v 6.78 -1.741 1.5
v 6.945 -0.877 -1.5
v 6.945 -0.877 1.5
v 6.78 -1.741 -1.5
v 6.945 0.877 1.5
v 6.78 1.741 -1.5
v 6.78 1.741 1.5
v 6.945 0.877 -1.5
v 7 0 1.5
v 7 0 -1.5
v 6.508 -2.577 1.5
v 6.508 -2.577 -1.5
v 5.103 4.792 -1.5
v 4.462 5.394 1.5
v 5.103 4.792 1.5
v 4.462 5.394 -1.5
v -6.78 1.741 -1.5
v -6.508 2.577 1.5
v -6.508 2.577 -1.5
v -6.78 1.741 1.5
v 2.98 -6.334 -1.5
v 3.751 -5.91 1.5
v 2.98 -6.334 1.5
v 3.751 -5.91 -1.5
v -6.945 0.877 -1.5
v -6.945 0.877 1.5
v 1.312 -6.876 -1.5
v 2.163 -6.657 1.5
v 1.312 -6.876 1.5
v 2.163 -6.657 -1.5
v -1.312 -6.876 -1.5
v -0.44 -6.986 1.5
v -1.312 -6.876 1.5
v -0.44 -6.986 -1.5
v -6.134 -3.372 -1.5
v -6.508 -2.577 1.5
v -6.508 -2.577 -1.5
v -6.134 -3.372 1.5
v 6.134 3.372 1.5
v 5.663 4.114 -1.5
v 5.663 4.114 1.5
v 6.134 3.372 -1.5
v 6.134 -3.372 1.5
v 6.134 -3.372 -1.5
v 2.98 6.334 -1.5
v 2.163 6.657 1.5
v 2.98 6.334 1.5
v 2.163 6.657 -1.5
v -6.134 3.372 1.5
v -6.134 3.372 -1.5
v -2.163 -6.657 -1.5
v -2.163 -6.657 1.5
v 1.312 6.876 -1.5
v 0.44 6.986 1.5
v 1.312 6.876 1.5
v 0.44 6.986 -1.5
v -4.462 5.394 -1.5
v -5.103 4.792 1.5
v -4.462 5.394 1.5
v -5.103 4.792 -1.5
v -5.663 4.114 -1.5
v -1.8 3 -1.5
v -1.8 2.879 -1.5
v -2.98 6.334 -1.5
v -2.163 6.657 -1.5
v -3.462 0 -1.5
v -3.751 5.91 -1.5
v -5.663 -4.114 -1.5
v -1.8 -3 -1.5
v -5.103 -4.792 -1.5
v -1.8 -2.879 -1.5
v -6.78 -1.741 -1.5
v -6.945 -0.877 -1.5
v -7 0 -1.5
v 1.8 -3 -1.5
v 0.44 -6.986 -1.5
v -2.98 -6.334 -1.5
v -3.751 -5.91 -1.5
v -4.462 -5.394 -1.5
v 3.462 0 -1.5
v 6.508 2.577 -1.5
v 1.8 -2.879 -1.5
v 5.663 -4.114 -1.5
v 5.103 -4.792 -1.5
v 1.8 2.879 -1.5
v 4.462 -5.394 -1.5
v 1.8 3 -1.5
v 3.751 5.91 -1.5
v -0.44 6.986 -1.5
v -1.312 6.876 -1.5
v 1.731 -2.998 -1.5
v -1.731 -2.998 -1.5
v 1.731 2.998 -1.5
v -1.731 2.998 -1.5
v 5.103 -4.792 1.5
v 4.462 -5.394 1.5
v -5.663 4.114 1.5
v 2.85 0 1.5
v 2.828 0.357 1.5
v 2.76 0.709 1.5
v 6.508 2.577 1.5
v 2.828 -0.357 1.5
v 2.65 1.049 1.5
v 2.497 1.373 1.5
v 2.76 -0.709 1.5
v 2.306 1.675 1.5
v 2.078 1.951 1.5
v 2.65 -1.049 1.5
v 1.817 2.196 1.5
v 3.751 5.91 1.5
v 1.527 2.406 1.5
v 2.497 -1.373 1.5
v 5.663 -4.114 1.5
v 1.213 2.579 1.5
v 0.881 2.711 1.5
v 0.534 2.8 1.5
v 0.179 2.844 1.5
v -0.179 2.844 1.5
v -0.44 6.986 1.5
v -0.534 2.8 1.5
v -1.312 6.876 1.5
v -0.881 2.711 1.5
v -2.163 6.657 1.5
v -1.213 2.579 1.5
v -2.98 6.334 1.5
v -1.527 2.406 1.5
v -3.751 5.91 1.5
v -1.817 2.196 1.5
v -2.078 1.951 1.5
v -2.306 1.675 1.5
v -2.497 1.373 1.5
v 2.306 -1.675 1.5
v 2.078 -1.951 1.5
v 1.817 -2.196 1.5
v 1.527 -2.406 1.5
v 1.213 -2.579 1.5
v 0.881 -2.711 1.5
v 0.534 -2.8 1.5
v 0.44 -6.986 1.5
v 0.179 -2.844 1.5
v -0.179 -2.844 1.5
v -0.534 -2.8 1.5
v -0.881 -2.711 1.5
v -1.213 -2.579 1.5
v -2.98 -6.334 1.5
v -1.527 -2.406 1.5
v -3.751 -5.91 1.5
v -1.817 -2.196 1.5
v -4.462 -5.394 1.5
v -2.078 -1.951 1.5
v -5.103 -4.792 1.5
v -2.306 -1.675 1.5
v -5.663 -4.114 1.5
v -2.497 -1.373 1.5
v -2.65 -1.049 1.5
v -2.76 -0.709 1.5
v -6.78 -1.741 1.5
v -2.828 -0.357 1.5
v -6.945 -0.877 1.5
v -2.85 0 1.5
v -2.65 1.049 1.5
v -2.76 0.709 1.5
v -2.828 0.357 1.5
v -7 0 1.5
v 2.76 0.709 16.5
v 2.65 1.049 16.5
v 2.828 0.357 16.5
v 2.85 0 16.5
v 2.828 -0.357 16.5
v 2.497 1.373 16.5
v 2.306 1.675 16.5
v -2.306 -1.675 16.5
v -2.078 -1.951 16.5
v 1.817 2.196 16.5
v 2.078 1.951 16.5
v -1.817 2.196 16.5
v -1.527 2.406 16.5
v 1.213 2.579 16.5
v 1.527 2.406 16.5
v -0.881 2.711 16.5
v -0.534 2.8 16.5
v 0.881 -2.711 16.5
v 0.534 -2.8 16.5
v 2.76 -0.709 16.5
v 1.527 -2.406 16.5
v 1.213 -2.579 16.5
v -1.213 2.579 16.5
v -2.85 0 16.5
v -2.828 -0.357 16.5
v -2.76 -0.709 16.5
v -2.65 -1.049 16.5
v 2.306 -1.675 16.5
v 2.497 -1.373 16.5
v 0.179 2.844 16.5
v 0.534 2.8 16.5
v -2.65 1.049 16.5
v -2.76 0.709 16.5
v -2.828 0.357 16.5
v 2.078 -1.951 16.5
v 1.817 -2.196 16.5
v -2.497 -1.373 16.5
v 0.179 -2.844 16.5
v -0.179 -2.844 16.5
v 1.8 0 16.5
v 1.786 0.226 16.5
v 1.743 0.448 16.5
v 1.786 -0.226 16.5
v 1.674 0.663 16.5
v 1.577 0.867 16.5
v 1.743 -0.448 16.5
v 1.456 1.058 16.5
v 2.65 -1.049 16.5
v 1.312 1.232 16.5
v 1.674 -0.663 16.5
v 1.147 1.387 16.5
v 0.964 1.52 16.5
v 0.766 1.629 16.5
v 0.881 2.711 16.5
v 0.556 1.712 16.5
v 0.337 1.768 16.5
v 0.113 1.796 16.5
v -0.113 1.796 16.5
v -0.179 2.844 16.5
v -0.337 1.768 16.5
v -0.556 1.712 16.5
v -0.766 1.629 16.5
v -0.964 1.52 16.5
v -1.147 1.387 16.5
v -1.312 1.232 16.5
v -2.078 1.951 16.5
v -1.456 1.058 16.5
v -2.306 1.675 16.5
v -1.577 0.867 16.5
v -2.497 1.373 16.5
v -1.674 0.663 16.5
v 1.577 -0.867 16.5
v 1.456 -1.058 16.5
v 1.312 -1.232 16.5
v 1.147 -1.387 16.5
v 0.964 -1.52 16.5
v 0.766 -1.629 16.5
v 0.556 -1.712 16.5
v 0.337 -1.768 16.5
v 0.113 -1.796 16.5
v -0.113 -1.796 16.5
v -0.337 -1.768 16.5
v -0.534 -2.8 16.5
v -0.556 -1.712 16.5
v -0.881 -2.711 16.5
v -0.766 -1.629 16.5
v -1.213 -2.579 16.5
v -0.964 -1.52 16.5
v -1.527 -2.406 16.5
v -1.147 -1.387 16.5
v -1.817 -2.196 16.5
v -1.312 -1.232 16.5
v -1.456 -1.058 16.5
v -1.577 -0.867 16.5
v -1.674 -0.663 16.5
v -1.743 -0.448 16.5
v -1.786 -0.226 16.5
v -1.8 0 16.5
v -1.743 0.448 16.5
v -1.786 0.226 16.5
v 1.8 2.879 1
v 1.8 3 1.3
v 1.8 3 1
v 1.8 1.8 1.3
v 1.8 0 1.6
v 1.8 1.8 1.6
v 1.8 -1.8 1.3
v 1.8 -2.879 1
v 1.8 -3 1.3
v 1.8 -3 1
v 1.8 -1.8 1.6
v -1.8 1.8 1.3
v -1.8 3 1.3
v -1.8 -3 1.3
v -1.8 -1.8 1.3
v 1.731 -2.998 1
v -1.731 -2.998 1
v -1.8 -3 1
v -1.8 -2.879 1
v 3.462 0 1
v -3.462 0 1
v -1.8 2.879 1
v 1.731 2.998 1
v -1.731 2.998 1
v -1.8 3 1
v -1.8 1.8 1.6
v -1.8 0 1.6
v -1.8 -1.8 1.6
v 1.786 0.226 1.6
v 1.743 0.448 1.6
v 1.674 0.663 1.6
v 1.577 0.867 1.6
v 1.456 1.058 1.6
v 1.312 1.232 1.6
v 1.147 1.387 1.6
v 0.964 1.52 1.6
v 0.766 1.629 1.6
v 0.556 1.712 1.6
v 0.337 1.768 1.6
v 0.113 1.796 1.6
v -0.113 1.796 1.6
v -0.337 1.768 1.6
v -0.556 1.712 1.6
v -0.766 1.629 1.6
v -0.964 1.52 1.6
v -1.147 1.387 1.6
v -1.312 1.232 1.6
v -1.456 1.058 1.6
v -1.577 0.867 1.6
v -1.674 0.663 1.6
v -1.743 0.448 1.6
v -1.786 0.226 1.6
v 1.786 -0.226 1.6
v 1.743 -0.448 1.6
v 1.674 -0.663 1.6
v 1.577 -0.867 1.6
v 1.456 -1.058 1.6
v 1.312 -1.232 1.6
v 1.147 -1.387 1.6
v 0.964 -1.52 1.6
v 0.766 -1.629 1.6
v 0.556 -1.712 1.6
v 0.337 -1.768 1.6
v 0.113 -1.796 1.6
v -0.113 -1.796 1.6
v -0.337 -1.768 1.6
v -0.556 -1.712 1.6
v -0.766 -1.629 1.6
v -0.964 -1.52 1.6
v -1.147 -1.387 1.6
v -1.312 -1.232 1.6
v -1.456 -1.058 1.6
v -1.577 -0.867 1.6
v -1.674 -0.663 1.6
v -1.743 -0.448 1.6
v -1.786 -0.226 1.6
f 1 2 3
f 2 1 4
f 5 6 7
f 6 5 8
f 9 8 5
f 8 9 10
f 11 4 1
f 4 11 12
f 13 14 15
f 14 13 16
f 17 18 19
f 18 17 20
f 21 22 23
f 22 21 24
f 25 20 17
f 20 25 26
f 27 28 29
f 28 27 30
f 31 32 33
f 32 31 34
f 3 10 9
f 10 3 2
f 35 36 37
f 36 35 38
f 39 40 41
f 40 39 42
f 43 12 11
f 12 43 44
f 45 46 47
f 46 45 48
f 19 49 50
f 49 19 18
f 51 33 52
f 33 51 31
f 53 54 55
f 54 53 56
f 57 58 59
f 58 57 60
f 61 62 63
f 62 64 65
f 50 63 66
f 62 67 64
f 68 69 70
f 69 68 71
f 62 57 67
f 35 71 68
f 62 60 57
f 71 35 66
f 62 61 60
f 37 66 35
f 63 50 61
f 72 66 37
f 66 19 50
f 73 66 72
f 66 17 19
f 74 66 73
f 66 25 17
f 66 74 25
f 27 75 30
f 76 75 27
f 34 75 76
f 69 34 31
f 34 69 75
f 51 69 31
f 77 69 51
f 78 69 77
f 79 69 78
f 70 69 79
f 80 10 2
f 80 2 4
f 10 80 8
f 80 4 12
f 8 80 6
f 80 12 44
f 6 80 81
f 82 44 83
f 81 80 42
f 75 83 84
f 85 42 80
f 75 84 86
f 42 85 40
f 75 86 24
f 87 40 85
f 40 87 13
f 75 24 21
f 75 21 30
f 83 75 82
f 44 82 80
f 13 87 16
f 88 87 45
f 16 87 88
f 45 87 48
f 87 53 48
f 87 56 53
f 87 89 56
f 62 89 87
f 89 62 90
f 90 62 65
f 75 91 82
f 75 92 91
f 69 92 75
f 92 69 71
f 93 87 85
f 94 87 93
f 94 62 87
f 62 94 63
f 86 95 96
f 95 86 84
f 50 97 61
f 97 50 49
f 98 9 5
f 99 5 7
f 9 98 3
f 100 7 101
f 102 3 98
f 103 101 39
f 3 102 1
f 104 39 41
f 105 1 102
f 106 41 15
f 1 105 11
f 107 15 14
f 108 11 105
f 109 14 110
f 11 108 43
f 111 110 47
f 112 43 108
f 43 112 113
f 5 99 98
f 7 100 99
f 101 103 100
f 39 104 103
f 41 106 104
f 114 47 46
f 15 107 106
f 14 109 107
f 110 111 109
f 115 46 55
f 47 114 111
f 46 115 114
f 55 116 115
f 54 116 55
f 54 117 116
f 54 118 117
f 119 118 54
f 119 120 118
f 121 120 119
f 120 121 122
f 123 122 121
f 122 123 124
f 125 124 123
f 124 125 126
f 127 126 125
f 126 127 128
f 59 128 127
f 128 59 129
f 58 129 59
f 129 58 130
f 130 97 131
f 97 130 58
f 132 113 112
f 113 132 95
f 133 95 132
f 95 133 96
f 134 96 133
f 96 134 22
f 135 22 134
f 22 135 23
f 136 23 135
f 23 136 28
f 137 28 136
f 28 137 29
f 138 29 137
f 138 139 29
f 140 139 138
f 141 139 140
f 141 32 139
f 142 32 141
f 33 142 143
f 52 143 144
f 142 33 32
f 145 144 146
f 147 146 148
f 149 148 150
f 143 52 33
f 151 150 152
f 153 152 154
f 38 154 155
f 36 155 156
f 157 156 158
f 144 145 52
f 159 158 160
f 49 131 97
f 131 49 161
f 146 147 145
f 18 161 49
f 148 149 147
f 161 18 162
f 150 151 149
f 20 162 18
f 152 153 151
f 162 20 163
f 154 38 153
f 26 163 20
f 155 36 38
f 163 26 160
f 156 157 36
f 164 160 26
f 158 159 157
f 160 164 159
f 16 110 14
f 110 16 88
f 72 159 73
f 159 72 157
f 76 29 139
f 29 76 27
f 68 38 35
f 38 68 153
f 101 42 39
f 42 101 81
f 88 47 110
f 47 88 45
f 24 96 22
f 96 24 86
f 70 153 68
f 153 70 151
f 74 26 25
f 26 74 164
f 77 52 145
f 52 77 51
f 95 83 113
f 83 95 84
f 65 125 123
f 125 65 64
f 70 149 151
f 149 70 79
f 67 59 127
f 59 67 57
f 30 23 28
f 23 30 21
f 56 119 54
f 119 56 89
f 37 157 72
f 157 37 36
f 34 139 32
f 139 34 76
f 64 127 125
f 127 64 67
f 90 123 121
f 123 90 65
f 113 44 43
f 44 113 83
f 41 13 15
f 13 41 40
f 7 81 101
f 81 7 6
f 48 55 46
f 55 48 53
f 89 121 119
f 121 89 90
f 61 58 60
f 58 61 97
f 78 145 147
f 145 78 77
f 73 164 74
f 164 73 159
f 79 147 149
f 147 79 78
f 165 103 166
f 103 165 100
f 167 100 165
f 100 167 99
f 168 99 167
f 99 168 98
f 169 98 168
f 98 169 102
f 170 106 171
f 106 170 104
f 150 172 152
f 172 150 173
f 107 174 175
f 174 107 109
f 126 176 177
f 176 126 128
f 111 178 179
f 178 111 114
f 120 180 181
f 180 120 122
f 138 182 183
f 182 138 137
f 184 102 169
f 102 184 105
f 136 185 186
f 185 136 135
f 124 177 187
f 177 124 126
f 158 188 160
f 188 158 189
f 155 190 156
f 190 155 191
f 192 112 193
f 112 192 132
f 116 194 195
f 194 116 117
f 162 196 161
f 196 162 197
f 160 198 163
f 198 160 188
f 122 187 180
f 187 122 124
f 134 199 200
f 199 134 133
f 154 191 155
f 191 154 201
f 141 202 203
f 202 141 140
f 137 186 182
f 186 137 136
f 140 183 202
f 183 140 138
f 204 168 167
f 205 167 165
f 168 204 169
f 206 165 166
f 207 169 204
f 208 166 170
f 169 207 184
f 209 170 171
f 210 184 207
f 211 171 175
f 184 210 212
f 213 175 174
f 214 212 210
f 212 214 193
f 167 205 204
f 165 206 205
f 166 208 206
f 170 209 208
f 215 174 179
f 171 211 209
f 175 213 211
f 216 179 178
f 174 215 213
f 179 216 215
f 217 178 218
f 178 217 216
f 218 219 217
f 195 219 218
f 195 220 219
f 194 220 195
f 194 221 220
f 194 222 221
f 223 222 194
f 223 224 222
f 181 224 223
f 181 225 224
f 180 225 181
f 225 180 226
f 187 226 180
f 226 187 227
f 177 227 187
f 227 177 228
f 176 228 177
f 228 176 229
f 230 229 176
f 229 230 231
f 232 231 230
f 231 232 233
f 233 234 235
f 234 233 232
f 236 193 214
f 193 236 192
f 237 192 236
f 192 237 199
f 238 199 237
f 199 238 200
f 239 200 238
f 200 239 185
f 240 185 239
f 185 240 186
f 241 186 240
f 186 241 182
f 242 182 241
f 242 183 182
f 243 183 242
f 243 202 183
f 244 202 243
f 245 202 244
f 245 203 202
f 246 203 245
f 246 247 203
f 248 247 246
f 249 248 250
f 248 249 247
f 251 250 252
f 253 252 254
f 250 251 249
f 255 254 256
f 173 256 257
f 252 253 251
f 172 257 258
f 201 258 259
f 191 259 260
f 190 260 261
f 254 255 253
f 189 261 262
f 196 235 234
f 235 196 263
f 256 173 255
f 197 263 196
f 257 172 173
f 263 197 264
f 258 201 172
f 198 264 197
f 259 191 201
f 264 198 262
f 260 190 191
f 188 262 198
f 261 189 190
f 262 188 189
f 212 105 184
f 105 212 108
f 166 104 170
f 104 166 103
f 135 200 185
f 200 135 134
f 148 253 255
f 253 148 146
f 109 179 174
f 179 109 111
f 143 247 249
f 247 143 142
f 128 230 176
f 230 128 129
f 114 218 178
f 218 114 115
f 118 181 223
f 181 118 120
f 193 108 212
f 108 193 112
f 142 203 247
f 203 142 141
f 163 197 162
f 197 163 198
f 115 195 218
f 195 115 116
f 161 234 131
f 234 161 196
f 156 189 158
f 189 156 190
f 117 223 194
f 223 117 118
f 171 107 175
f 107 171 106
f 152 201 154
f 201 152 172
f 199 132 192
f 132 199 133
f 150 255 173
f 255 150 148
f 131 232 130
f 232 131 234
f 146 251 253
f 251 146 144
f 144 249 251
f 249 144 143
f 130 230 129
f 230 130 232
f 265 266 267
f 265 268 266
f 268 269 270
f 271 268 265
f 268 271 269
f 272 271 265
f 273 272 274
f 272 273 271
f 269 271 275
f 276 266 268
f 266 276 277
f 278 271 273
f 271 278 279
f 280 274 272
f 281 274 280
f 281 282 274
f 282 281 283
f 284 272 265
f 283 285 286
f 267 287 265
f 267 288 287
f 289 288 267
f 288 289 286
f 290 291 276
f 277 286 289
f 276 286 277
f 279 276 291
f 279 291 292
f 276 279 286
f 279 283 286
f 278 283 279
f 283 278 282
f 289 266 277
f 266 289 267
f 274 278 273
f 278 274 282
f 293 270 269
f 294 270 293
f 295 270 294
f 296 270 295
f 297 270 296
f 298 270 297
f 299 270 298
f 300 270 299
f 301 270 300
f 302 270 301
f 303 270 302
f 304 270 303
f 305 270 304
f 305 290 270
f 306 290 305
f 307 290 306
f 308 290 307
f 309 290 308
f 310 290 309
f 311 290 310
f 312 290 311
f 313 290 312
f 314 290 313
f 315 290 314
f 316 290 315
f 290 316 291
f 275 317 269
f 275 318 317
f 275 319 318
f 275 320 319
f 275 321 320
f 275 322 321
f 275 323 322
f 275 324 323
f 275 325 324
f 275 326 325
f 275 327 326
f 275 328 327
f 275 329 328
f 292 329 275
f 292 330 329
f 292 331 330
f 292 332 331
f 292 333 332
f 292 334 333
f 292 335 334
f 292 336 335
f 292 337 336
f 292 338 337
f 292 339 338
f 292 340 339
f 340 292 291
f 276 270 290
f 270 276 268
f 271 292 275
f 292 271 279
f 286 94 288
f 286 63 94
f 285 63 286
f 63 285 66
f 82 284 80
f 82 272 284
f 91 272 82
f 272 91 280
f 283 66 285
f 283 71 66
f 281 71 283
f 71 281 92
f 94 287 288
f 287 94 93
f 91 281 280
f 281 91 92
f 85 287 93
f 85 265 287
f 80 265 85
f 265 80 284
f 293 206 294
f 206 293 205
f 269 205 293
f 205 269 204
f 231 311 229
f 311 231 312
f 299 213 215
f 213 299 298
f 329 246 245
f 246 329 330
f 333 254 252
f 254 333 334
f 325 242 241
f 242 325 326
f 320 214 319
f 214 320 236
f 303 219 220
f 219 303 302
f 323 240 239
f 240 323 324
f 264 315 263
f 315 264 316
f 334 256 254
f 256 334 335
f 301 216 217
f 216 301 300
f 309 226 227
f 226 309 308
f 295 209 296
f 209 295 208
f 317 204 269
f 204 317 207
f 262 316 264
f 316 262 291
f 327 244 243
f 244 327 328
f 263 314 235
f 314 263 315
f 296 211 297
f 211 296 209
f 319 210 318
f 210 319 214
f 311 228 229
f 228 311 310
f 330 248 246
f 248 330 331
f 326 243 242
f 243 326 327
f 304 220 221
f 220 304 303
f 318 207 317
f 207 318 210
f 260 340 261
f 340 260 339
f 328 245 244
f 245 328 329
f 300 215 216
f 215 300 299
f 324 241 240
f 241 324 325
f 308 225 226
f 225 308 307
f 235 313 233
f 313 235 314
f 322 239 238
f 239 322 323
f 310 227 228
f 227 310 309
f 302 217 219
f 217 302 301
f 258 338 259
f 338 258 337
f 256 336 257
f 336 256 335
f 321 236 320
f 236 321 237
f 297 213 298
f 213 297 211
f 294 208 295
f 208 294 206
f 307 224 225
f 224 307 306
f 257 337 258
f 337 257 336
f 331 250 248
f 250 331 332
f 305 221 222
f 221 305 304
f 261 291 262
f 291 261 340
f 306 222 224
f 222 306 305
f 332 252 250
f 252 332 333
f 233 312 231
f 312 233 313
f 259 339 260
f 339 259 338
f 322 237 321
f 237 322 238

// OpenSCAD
$fn = 50;


difference() {
	union() {
		translate(v = [0, 0, -1.5000000000]) {
			cylinder(h = 3, r = 7.0000000000);
		}
		translate(v = [0, 0, -1.5000000000]) {
			cylinder(h = 18, r = 2.8500000000);
		}
	}
	union() {
		translate(v = [0, 0, -1.5000000000]) {
			rotate(a = [0, 0, 0]) {
				difference() {
					union() {
						translate(v = [-1.8000000000, -3.0000000000, -0.3000000000]) {
							cube(size = [3.6000000000, 6.0000000000, 0.3000000000]);
						}
						translate(v = [-1.8000000000, -1.8000000000, -0.6000000000]) {
							cube(size = [3.6000000000, 3.6000000000, 0.3000000000]);
						}
						translate(v = [-1.8000000000, -3.0000000000, 2.5000000000]) {
							cube(size = [3.6000000000, 6.0000000000, 0.3000000000]);
						}
						translate(v = [-1.8000000000, -1.8000000000, 2.8000000000]) {
							cube(size = [3.6000000000, 3.6000000000, 0.3000000000]);
						}
						linear_extrude(height = 2.5000000000) {
							polygon(points = [[3.4620000000, 0.0000000000], [1.7310000000, 2.9981799479], [-1.7310000000, 2.9981799479], [-3.4620000000, 0.0000000000], [-1.7310000000, -2.9981799479], [1.7310000000, -2.9981799479]]);
						}
						translate(v = [-1.8000000000, -3.0000000000, -0.3000000000]) {
							cube(size = [3.6000000000, 6.0000000000, 0.3000000000]);
						}
						translate(v = [-1.8000000000, -1.8000000000, -0.6000000000]) {
							cube(size = [3.6000000000, 3.6000000000, 0.3000000000]);
						}
						translate(v = [-1.8000000000, -3.0000000000, 2.5000000000]) {
							cube(size = [3.6000000000, 6.0000000000, 0.3000000000]);
						}
						translate(v = [-1.8000000000, -1.8000000000, 2.8000000000]) {
							cube(size = [3.6000000000, 3.6000000000, 0.3000000000]);
						}
						translate(v = [-1.8000000000, -3.0000000000, -0.3000000000]) {
							cube(size = [3.6000000000, 6.0000000000, 0.3000000000]);
						}
						translate(v = [-1.8000000000, -1.8000000000, -0.6000000000]) {
							cube(size = [3.6000000000, 3.6000000000, 0.3000000000]);
						}
						translate(v = [-1.8000000000, -3.0000000000, 2.5000000000]) {
							cube(size = [3.6000000000, 6.0000000000, 0.3000000000]);
						}
						translate(v = [-1.8000000000, -1.8000000000, 2.8000000000]) {
							cube(size = [3.6000000000, 3.6000000000, 0.3000000000]);
						}
					}
					union();
				}
			}
		}
		translate(v = [0, 0, -50.0000000000]) {
			cylinder(h = 100, r = 1.8000000000);
		}
	}
}
